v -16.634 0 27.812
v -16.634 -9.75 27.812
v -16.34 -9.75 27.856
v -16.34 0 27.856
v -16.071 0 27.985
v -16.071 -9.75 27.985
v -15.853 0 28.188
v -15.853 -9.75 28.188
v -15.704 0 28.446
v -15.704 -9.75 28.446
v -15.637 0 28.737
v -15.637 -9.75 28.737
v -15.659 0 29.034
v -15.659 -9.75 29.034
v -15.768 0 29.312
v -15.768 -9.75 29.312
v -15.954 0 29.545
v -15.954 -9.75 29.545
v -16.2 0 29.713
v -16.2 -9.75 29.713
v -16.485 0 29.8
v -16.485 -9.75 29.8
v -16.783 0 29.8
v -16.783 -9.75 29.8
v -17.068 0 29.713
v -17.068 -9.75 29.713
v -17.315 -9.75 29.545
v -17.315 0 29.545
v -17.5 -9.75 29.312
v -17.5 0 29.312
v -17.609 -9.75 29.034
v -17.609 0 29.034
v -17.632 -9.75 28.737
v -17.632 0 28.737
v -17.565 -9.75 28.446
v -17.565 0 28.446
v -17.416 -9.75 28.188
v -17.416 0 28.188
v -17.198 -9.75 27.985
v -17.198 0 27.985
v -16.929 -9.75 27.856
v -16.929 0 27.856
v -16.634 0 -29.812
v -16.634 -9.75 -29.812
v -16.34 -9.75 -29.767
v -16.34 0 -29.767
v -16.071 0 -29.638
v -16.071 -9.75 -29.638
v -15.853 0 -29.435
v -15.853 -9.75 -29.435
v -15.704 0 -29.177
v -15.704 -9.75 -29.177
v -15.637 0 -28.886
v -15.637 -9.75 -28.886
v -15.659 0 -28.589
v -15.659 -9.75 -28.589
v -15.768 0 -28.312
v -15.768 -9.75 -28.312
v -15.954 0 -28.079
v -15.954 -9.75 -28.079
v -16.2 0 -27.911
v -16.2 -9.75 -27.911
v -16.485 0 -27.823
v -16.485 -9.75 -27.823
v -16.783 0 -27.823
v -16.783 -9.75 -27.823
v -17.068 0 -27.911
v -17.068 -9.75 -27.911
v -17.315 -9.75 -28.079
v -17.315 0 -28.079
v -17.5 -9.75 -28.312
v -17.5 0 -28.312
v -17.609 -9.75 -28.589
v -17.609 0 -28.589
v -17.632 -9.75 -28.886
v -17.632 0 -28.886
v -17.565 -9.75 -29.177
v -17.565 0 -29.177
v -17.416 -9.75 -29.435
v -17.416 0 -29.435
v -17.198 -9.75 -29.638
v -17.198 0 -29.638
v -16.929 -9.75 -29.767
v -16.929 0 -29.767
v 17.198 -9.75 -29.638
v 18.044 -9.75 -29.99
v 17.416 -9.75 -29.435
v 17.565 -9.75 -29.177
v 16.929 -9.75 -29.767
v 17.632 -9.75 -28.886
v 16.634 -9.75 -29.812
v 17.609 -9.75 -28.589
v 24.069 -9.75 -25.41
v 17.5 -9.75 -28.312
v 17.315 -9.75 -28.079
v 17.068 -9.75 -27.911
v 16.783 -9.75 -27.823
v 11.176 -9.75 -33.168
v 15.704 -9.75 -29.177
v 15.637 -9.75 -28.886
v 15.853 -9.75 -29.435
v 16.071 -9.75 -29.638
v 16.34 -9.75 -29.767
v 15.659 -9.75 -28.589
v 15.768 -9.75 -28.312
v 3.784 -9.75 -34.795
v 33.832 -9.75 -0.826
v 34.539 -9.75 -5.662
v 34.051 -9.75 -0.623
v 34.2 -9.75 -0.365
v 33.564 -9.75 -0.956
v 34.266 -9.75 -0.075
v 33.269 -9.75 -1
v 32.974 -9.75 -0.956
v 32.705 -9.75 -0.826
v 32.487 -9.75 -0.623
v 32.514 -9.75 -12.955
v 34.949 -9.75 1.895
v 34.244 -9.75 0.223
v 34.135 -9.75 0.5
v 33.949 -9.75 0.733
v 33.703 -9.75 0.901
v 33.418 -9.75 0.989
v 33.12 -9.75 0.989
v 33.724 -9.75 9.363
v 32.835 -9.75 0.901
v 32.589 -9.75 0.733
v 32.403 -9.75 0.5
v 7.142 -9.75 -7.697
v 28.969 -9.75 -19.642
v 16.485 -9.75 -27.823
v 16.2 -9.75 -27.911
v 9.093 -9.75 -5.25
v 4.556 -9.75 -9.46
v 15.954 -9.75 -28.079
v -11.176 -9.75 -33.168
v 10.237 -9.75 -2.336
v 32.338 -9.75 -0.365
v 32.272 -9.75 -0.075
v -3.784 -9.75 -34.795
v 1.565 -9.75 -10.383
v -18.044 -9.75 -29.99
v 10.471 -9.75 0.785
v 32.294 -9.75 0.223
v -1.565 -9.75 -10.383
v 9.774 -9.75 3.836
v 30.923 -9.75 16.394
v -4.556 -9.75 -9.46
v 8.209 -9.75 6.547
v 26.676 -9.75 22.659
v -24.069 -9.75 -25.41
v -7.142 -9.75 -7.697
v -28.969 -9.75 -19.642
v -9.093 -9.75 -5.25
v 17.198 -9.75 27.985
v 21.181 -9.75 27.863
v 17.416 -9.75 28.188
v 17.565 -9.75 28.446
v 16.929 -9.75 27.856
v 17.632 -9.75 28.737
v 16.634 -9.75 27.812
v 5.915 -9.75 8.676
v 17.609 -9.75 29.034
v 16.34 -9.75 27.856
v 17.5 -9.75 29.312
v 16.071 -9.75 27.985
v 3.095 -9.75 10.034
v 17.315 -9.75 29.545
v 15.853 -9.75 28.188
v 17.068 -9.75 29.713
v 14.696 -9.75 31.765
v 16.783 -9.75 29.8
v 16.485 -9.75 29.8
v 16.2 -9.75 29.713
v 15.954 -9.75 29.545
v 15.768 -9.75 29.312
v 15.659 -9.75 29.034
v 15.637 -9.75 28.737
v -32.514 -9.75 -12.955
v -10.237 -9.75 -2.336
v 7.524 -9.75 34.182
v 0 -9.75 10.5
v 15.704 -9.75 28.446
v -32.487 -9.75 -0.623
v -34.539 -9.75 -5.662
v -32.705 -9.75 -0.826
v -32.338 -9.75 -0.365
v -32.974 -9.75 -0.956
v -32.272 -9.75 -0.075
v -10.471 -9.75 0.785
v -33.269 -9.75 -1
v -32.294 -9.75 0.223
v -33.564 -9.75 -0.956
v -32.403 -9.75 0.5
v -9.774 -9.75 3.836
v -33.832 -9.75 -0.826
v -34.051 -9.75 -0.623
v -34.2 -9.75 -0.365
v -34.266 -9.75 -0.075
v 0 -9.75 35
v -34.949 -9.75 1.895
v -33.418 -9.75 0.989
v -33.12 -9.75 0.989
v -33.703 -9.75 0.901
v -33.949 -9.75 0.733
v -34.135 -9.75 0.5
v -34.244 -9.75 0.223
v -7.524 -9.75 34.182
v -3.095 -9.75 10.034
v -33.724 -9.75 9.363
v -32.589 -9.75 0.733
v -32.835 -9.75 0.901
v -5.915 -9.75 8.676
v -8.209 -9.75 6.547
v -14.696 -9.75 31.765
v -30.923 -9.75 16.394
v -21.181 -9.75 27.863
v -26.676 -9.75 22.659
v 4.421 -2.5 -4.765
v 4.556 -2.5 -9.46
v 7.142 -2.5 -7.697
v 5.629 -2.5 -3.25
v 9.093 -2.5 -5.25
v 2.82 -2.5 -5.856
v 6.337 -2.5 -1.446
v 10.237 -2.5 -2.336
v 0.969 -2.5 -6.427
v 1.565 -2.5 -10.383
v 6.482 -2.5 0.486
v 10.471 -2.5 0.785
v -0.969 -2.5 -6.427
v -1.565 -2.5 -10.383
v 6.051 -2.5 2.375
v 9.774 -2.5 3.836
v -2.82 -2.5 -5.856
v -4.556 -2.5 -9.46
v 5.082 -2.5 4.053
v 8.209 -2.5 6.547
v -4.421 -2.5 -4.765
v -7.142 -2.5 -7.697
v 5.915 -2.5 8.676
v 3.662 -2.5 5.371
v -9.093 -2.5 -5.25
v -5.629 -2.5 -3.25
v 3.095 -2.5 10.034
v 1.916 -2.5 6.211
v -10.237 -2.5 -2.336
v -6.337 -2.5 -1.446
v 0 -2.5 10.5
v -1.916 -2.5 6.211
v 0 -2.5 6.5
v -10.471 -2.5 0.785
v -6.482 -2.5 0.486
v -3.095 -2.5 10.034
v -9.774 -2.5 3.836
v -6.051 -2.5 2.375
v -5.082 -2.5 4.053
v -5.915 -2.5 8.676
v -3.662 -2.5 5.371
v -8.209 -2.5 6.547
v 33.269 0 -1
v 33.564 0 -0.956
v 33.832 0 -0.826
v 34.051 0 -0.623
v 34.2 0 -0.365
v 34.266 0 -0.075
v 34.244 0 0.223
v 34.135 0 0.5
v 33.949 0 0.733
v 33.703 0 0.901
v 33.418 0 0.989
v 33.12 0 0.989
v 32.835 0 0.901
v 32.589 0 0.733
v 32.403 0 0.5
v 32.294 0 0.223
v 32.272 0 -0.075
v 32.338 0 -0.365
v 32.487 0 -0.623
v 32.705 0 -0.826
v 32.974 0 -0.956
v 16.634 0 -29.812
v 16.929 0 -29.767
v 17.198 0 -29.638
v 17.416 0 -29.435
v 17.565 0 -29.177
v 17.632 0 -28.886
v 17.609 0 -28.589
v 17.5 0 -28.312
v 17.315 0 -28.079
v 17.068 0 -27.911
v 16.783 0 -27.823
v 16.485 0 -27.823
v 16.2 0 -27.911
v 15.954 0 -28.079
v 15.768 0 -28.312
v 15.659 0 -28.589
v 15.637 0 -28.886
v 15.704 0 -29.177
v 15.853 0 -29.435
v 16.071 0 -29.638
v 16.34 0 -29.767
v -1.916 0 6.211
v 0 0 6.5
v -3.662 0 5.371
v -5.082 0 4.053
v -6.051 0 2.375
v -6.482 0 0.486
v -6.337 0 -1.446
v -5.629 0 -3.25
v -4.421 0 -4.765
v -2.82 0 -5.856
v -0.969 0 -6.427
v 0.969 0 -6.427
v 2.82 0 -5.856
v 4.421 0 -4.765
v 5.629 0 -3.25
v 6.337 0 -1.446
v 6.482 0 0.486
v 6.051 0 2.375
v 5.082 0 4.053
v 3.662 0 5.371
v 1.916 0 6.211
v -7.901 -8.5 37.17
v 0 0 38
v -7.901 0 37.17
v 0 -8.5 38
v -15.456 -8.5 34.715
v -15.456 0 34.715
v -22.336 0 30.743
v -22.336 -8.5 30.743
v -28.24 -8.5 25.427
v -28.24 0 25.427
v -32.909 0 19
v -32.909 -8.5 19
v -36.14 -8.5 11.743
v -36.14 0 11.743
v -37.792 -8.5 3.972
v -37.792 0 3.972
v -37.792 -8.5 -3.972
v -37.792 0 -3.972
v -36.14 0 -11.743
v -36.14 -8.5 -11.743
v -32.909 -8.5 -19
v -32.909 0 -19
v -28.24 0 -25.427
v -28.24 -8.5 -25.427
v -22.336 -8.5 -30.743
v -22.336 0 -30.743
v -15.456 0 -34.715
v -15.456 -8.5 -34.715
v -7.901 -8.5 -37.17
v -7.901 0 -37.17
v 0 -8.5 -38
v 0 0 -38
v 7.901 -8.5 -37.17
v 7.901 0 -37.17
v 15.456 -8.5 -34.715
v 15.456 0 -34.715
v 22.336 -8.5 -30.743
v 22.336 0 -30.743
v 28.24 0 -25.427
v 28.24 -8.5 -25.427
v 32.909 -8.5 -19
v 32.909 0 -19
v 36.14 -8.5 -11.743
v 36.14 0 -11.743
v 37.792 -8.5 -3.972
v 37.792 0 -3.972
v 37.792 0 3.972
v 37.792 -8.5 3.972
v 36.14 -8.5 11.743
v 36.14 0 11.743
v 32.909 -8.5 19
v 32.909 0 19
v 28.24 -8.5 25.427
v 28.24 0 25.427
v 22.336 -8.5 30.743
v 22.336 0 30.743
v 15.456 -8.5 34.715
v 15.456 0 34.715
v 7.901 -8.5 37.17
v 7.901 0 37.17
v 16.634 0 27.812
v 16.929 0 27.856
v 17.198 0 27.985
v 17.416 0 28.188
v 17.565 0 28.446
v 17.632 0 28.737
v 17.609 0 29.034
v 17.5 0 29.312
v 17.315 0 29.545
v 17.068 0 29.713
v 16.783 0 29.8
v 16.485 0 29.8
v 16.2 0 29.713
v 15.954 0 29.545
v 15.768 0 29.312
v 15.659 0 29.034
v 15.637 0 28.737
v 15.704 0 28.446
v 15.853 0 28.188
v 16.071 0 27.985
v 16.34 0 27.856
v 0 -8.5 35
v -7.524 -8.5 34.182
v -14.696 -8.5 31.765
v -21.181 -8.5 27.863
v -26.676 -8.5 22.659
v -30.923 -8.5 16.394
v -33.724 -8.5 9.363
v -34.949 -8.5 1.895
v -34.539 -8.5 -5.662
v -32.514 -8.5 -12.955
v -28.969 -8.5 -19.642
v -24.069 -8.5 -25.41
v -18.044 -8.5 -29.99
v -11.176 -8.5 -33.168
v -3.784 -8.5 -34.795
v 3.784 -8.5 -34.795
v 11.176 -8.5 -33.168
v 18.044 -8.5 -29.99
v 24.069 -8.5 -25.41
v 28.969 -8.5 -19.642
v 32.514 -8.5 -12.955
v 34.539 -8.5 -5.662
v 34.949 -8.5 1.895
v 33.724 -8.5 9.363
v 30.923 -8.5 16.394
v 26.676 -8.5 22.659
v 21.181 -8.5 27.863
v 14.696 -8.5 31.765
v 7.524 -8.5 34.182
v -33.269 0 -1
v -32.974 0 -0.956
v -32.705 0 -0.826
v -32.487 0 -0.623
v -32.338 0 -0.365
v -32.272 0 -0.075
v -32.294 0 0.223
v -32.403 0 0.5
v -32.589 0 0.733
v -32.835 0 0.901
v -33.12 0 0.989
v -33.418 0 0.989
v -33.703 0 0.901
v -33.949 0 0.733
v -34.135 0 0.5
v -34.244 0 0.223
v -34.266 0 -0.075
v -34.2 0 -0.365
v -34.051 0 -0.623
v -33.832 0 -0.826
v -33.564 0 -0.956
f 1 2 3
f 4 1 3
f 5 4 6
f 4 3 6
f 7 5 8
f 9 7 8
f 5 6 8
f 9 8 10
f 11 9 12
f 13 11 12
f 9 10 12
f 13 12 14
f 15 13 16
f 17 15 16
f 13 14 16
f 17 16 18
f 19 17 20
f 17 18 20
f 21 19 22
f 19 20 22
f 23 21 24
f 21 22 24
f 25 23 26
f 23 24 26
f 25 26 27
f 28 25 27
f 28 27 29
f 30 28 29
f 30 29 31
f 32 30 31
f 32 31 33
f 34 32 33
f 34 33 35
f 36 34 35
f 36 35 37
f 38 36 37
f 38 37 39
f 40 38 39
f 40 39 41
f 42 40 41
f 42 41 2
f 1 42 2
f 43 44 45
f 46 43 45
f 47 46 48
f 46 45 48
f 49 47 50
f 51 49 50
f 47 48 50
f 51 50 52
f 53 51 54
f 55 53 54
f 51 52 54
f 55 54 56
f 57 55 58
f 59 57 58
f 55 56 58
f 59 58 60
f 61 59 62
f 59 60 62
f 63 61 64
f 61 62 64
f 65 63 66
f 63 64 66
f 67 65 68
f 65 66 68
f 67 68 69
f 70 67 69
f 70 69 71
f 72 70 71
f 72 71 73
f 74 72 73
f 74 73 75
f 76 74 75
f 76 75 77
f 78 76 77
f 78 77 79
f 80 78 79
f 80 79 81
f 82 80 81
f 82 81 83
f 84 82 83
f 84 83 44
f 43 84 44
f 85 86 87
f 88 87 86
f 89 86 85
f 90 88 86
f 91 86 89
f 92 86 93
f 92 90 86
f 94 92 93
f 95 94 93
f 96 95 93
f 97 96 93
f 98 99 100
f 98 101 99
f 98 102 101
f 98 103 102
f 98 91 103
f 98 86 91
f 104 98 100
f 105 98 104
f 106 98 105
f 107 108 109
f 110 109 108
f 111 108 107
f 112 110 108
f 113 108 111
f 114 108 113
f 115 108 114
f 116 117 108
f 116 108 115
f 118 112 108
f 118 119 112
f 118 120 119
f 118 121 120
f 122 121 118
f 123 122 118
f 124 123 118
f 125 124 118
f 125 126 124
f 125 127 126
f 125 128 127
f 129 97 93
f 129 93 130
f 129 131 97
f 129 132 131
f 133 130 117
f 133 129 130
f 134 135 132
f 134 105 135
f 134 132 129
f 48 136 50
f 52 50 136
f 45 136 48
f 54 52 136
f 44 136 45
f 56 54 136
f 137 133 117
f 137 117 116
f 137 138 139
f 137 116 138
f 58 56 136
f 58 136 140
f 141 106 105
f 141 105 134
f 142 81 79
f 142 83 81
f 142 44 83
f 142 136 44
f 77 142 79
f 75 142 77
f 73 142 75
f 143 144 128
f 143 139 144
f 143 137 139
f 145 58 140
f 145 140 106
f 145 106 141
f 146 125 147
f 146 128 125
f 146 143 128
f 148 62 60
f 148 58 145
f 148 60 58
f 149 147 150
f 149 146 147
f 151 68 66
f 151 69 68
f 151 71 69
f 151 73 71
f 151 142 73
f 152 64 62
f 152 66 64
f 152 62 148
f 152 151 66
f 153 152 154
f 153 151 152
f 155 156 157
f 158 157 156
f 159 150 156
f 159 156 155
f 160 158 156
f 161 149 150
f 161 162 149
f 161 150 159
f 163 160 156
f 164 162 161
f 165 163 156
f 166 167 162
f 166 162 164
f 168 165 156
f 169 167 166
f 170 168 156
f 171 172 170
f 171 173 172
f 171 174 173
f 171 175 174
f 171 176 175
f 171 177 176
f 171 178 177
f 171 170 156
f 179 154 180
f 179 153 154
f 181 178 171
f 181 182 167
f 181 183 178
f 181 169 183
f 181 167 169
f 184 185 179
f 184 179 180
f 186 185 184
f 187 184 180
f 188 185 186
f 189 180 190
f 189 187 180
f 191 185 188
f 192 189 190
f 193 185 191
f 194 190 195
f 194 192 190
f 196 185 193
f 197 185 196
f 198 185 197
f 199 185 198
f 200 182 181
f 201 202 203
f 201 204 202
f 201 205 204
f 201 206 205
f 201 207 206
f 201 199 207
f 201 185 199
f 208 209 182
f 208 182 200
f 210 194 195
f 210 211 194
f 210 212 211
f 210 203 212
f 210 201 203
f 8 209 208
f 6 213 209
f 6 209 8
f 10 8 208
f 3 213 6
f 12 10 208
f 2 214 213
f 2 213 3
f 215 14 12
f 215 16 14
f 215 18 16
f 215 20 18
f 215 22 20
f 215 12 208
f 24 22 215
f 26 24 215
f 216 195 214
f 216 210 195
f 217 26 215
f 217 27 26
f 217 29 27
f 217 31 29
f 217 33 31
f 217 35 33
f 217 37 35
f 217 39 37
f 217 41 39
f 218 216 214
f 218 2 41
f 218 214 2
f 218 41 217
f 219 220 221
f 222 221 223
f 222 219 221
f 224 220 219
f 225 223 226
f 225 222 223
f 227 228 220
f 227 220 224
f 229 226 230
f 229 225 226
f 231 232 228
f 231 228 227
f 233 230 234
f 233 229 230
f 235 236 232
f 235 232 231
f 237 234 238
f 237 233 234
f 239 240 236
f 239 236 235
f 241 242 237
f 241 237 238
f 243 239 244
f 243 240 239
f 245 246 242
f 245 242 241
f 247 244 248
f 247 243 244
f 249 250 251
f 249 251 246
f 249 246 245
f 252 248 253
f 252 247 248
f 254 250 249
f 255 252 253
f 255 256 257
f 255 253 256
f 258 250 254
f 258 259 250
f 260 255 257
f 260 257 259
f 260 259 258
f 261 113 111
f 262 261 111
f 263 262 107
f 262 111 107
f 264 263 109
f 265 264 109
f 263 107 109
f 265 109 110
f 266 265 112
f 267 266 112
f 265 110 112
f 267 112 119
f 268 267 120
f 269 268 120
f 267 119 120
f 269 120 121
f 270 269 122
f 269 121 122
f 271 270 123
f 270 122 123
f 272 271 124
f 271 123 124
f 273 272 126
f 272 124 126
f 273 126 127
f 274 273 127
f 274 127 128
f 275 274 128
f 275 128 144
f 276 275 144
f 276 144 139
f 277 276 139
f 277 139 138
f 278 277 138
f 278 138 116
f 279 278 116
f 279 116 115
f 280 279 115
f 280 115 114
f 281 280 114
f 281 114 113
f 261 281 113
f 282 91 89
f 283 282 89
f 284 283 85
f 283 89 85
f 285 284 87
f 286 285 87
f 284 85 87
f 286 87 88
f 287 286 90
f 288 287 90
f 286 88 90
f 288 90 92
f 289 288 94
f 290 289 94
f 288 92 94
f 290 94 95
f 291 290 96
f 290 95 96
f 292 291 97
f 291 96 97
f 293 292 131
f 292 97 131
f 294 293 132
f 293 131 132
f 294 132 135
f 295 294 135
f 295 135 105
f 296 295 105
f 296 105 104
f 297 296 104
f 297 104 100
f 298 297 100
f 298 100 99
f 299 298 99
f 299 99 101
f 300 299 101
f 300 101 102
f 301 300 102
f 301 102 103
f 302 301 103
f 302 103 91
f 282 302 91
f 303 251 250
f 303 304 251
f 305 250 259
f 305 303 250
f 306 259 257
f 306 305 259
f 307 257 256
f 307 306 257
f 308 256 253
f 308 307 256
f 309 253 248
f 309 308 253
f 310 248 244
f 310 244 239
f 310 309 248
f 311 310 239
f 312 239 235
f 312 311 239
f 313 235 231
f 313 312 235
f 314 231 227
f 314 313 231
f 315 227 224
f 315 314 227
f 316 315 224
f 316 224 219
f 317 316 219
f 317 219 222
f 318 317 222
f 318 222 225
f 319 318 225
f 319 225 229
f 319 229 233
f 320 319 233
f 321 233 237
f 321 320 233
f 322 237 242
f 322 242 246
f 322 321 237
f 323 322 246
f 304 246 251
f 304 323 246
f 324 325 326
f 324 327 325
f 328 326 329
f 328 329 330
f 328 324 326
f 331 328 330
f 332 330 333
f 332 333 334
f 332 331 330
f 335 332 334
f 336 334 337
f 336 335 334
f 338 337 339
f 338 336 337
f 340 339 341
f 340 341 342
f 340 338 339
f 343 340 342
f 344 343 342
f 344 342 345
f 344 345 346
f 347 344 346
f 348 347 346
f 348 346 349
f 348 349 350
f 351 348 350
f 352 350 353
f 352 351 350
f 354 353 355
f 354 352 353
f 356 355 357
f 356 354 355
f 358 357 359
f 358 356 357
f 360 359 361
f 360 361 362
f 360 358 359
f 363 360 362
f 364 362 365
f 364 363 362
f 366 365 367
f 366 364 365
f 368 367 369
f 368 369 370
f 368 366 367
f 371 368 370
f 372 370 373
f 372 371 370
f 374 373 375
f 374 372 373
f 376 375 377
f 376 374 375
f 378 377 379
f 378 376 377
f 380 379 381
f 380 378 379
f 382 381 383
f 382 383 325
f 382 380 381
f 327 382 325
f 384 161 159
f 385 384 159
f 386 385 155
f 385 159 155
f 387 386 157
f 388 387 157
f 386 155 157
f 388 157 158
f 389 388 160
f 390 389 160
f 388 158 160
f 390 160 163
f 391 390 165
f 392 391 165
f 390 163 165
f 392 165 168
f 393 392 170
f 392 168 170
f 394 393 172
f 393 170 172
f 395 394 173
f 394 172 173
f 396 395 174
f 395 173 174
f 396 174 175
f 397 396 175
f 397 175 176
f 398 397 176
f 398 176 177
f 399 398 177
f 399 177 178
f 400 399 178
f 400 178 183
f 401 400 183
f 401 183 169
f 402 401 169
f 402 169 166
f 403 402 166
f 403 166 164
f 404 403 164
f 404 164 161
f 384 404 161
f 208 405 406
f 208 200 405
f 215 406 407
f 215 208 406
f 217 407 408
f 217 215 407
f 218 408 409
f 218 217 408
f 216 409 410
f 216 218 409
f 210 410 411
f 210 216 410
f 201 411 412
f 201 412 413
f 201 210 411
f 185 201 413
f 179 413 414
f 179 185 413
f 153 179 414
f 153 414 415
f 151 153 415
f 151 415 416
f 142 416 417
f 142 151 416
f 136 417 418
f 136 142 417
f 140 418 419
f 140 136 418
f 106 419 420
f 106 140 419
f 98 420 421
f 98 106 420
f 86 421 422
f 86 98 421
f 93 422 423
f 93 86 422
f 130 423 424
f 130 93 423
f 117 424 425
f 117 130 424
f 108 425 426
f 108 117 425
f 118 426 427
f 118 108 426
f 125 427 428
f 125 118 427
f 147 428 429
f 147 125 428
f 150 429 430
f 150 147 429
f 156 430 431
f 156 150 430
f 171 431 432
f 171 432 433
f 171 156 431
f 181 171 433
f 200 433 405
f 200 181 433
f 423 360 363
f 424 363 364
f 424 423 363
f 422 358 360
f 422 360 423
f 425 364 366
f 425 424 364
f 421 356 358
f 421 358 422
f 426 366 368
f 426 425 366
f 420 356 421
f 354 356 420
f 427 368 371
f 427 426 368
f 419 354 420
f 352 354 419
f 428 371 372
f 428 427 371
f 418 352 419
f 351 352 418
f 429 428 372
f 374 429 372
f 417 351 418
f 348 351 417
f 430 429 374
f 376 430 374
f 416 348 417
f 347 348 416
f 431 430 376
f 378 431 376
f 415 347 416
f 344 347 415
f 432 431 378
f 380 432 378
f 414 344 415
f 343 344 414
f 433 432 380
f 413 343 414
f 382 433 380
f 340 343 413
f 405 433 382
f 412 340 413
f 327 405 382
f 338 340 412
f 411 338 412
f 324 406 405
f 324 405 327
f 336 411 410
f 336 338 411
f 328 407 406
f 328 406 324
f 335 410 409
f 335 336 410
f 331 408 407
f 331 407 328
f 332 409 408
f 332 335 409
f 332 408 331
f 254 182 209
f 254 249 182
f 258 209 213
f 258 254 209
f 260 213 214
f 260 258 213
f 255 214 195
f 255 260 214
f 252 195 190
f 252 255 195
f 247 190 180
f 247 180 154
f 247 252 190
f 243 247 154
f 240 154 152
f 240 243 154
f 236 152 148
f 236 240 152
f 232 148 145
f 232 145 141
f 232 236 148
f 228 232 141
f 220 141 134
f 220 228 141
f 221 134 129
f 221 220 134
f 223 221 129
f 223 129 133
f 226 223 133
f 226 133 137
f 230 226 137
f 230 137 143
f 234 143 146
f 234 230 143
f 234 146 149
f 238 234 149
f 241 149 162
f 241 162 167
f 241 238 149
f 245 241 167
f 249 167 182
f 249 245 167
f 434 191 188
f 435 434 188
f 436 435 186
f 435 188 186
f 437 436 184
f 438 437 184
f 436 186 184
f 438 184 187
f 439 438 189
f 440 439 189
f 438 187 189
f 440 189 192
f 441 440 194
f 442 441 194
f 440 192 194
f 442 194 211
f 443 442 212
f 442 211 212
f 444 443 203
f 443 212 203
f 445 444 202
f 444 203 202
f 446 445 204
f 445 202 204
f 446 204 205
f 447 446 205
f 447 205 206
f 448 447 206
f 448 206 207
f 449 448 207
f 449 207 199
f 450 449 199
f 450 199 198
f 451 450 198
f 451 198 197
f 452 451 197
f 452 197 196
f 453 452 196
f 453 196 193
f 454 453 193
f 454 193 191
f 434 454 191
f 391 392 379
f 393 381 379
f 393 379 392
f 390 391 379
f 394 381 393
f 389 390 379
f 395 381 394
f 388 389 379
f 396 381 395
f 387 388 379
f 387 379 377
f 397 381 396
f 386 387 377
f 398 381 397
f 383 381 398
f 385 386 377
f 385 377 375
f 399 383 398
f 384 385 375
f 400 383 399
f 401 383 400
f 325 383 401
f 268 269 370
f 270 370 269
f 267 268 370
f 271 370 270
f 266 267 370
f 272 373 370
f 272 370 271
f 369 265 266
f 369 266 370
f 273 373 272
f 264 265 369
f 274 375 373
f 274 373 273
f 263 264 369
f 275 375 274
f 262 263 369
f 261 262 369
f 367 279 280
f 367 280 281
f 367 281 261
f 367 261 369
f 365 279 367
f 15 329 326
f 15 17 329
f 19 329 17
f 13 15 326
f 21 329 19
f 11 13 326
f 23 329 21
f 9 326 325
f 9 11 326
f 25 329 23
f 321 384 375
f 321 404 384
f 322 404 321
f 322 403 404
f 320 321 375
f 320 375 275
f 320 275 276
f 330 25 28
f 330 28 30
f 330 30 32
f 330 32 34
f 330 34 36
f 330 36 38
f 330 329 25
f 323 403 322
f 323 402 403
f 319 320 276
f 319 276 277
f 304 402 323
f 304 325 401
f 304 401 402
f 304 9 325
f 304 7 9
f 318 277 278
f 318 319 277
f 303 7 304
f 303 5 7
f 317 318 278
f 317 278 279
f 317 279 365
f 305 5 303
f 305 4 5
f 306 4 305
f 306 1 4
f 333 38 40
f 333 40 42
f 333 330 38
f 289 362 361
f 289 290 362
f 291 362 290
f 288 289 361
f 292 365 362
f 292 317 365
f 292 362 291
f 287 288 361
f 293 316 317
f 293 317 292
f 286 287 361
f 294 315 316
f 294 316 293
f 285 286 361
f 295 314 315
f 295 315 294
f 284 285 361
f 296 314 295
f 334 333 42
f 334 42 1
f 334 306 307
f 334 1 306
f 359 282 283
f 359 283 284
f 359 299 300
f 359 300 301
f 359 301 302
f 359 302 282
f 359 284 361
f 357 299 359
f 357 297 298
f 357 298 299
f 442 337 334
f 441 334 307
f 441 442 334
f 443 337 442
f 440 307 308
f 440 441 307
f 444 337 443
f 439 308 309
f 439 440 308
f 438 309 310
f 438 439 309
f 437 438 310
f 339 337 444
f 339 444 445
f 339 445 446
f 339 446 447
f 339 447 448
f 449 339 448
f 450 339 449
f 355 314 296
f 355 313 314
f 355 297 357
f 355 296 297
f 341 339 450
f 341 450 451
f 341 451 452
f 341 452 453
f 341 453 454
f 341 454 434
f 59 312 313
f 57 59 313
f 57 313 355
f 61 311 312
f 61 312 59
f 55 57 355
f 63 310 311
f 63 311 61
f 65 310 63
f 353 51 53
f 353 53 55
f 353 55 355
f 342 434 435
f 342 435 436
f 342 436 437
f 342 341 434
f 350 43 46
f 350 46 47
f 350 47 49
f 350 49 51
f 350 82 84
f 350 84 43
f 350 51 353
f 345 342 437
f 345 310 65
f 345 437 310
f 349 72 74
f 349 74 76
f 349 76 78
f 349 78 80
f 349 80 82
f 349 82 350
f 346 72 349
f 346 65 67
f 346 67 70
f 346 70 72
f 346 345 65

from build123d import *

# Parameters (mm, degrees)
SKETCH2_R          = 1
CUT_EXTRUDE1_DEPTH = 55.617419382


with BuildPart() as part:
    # Sketch1 → Revolve1 (revolve)
    with BuildSketch(Plane.XY, mode=Mode.PRIVATE) as revolve1_sk:
        Polygon((-6.5, 0), (-38, 0), (-38, -8.5), (-35, -8.5), (-35, -9.75), (-10.5, -9.75), (-10.5, -2.5), (-6.5, -2.5), align=None)
    revolve(revolve1_sk.sketch.rotate(Axis((0, 38.708668819, 0), (0, -1, 0)), 270), axis=Axis((0, 38.708668819, 0), (0, -1, 0)))

    # Sketch2 → Cut-Extrude1 (cut, through all)
    with BuildSketch(Plane.XZ.offset(9.75)):
        with Locations(Location((-33.26875, 0, 0), (0, 0, 270))):
            Circle(SKETCH2_R)
        with Locations(Location((-16.634375, 28.811582652, 0), (0, 0, 270))):
            Circle(SKETCH2_R)
        with Locations(Location((16.634375, 28.811582652, 0), (0, 0, 270))):
            Circle(SKETCH2_R)
        with Locations(Location((33.26875, 0, 0), (0, 0, 270))):
            Circle(SKETCH2_R)
        with Locations(Location((16.634375, -28.811582652, 0), (0, 0, 270))):
            Circle(SKETCH2_R)
        with Locations(Location((-16.634375, -28.811582652, 0), (0, 0, 270))):
            Circle(SKETCH2_R)
    extrude(amount=-CUT_EXTRUDE1_DEPTH, mode=Mode.SUBTRACT)


solid = part.part
